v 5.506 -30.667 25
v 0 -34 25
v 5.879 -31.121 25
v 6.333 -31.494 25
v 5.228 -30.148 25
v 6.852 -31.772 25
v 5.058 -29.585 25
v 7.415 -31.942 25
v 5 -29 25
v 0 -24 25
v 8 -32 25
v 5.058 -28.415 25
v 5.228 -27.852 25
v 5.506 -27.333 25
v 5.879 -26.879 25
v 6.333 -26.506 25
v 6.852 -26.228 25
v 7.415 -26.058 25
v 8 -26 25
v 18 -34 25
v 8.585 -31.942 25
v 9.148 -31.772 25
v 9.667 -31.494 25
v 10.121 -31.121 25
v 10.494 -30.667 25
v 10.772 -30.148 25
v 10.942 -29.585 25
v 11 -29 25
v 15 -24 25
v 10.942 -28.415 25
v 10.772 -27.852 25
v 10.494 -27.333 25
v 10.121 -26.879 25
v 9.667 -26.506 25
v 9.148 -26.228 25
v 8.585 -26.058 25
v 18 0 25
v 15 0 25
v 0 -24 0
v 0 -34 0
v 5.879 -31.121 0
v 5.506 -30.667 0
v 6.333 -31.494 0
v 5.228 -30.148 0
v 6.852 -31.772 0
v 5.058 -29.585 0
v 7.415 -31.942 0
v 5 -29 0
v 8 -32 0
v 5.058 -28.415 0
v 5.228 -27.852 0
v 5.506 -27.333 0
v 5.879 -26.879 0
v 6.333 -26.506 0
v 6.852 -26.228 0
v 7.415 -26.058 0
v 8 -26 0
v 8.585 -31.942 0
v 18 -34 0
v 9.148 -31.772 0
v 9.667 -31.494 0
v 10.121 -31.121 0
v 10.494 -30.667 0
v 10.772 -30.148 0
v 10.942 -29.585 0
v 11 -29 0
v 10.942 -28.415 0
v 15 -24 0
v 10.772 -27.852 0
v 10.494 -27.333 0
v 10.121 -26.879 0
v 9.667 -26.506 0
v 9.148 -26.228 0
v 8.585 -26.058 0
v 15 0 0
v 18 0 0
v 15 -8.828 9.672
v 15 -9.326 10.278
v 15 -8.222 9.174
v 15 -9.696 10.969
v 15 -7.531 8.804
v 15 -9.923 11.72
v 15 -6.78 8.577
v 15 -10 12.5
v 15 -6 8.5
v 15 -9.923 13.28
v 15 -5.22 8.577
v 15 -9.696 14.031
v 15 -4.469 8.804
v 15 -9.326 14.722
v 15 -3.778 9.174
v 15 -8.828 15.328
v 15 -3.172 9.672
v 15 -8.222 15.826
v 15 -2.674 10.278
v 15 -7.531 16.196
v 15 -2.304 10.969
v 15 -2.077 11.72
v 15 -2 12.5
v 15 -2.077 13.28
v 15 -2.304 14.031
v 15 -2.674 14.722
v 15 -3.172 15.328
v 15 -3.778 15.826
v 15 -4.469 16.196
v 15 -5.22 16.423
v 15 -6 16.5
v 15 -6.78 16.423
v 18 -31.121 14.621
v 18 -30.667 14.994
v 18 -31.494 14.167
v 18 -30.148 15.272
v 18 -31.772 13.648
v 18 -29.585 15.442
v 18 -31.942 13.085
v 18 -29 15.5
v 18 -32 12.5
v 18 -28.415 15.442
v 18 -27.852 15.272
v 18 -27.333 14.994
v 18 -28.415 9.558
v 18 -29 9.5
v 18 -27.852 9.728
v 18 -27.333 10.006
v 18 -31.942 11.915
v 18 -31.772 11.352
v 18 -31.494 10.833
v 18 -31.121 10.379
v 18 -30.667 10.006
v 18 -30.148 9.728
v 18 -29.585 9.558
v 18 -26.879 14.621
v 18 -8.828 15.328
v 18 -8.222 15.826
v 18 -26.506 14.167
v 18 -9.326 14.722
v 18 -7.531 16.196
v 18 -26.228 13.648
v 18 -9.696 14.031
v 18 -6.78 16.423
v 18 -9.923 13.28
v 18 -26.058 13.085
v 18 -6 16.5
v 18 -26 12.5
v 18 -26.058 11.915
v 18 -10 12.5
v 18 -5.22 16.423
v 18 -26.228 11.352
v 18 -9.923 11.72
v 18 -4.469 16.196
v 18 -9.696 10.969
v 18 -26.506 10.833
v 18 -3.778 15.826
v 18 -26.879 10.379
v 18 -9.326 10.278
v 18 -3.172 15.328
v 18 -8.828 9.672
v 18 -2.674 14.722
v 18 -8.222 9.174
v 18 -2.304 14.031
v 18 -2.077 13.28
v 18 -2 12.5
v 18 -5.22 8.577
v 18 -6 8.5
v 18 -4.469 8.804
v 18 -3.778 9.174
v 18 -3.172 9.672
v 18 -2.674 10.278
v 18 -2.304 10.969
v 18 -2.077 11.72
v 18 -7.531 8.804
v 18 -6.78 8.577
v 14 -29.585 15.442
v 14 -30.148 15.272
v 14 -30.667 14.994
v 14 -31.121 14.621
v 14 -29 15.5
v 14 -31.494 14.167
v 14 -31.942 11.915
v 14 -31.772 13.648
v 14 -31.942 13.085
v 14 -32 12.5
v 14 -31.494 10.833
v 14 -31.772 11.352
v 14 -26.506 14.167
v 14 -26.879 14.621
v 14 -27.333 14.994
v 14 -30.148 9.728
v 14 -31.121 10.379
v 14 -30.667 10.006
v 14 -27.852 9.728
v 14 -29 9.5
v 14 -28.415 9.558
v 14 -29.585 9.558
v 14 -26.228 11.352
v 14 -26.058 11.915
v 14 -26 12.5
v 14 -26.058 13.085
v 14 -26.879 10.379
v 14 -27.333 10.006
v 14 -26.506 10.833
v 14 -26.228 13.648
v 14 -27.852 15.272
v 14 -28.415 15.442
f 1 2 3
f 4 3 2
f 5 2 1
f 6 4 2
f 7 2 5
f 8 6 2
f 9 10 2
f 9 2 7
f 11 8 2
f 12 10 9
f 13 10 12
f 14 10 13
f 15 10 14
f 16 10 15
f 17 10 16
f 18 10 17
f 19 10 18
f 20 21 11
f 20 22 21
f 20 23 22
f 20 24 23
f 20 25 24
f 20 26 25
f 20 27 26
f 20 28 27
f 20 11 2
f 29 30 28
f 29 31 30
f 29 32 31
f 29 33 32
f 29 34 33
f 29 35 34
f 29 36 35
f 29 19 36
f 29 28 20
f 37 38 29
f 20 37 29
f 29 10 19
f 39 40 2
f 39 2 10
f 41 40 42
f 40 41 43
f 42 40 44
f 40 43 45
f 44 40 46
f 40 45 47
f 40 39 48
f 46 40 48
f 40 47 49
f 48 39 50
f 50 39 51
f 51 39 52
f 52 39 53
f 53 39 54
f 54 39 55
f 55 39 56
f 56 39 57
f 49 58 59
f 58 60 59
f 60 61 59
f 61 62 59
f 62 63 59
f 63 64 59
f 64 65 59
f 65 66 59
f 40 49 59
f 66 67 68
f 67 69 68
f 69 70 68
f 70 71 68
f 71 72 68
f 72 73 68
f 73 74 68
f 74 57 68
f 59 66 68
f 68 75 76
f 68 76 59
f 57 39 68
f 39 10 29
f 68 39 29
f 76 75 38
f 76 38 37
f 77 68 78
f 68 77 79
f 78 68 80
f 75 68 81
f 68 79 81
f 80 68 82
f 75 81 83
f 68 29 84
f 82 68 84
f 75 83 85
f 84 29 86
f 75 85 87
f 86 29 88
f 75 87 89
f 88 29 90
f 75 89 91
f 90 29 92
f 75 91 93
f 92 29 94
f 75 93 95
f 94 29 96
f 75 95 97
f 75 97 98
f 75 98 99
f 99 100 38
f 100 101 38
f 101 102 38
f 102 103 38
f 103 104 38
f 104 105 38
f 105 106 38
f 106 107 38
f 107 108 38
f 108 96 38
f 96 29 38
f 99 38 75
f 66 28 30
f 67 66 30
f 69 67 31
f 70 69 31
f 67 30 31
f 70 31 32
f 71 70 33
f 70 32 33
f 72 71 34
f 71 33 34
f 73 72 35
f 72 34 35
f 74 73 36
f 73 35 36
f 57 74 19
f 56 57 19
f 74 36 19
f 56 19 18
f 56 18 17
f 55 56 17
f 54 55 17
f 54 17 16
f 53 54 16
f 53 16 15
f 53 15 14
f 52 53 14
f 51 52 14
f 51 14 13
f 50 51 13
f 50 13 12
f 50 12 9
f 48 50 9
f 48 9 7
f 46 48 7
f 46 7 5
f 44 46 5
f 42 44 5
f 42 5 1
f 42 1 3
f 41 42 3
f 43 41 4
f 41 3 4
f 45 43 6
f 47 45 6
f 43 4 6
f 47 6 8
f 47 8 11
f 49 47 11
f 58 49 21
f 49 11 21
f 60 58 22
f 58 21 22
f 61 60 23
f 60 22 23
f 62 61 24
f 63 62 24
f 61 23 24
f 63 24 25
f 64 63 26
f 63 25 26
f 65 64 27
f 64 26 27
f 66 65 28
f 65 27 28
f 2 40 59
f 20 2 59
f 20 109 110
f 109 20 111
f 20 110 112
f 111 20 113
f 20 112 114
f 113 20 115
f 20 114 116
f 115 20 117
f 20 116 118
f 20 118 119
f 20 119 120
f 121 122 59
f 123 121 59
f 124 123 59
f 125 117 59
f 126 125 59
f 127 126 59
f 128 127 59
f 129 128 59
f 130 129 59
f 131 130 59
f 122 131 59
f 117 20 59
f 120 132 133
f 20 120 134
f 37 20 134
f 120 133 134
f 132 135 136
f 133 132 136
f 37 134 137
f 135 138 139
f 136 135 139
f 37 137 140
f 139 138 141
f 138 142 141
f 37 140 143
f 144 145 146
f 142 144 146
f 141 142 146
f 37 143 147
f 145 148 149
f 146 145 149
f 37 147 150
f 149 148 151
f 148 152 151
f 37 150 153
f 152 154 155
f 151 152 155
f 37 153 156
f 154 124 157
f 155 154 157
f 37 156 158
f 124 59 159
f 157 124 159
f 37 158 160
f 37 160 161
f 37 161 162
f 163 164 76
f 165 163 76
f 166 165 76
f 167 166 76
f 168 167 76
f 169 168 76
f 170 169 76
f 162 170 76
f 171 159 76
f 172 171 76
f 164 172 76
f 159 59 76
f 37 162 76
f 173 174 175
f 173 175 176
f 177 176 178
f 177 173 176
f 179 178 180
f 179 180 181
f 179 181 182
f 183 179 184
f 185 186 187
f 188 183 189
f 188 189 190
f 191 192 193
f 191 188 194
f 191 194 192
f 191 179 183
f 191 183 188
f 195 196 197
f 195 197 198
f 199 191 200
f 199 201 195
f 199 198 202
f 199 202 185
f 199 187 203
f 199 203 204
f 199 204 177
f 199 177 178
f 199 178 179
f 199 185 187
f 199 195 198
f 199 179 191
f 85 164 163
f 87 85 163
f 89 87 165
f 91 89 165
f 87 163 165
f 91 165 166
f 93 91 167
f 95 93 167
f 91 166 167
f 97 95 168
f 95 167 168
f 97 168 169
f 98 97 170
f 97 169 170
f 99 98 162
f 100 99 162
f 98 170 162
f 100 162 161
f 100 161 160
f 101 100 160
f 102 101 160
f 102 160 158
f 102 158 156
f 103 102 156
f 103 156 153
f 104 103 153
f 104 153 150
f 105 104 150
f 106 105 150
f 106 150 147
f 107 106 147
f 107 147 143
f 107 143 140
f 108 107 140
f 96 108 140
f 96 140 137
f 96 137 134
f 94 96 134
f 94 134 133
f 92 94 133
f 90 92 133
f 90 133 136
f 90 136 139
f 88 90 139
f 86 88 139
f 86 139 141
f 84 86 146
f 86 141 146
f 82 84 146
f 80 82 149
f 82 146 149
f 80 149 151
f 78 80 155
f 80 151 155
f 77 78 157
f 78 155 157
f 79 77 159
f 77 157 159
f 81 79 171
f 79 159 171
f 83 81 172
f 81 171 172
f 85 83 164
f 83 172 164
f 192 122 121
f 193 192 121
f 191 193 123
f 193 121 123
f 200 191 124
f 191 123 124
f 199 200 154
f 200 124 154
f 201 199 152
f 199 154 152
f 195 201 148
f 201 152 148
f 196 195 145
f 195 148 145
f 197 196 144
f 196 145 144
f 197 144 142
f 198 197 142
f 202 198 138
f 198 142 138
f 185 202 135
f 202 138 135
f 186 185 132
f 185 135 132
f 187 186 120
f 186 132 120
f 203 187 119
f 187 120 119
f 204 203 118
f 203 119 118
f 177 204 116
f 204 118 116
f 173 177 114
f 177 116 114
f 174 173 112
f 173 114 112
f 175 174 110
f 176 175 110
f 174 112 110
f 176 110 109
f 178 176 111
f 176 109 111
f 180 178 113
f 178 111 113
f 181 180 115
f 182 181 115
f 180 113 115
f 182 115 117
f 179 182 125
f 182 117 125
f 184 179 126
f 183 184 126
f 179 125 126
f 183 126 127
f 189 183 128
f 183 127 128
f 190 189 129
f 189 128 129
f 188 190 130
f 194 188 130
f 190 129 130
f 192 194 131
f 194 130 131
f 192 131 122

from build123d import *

# Parameters (mm, degrees)
ESQUISSE1_W             = 18
ESQUISSE1_H             = 34
BOSS_EXTRU_1_DEPTH      = 25
ESQUISSE2_R             = 3
ESQUISSE2_W             = 15
ESQUISSE2_H             = 24
ENL_V_MAT_EXTRU_1_DEPTH = 26
ESQUISSE3_R             = 3
ENL_V_MAT_EXTRU_2_DEPTH = 4
ESQUISSE4_R             = 4
ENL_V_MAT_EXTRU_3_DEPTH = 19


with BuildPart() as part:
    # Esquisse1 → Boss.-Extru.1 (new body)
    with BuildSketch(Plane.XY):
        with Locations((9, -17)):
            Rectangle(ESQUISSE1_W, ESQUISSE1_H)
    extrude(amount=BOSS_EXTRU_1_DEPTH)

    # Esquisse2 → Enlèv. mat.-Extru.1 (cut, through all)
    with BuildSketch(Plane.XY.offset(25)):
        with Locations((8, -29)):
            Circle(ESQUISSE2_R)
        with Locations((7.5, -12)):
            Rectangle(ESQUISSE2_W, ESQUISSE2_H)
    extrude(amount=-ENL_V_MAT_EXTRU_1_DEPTH, mode=Mode.SUBTRACT)

    # Esquisse3 → Enlèv. mat.-Extru.2 (cut)
    with BuildSketch(Plane(origin=(18, 0, 0), x_dir=(0, 0, -1), z_dir=(1, 0, 0))):
        with Locations((-12.5, -29)):
            Circle(ESQUISSE3_R)
    extrude(amount=-ENL_V_MAT_EXTRU_2_DEPTH, mode=Mode.SUBTRACT)

    # Esquisse4 → Enlèv. mat.-Extru.3 (cut, through all)
    with BuildSketch(Plane(origin=(18, 0, 0), x_dir=(0, 0, -1), z_dir=(1, 0, 0))):
        with Locations((-12.5, -6)):
            Circle(ESQUISSE4_R)
    extrude(amount=-ENL_V_MAT_EXTRU_3_DEPTH, mode=Mode.SUBTRACT)


solid = part.part
